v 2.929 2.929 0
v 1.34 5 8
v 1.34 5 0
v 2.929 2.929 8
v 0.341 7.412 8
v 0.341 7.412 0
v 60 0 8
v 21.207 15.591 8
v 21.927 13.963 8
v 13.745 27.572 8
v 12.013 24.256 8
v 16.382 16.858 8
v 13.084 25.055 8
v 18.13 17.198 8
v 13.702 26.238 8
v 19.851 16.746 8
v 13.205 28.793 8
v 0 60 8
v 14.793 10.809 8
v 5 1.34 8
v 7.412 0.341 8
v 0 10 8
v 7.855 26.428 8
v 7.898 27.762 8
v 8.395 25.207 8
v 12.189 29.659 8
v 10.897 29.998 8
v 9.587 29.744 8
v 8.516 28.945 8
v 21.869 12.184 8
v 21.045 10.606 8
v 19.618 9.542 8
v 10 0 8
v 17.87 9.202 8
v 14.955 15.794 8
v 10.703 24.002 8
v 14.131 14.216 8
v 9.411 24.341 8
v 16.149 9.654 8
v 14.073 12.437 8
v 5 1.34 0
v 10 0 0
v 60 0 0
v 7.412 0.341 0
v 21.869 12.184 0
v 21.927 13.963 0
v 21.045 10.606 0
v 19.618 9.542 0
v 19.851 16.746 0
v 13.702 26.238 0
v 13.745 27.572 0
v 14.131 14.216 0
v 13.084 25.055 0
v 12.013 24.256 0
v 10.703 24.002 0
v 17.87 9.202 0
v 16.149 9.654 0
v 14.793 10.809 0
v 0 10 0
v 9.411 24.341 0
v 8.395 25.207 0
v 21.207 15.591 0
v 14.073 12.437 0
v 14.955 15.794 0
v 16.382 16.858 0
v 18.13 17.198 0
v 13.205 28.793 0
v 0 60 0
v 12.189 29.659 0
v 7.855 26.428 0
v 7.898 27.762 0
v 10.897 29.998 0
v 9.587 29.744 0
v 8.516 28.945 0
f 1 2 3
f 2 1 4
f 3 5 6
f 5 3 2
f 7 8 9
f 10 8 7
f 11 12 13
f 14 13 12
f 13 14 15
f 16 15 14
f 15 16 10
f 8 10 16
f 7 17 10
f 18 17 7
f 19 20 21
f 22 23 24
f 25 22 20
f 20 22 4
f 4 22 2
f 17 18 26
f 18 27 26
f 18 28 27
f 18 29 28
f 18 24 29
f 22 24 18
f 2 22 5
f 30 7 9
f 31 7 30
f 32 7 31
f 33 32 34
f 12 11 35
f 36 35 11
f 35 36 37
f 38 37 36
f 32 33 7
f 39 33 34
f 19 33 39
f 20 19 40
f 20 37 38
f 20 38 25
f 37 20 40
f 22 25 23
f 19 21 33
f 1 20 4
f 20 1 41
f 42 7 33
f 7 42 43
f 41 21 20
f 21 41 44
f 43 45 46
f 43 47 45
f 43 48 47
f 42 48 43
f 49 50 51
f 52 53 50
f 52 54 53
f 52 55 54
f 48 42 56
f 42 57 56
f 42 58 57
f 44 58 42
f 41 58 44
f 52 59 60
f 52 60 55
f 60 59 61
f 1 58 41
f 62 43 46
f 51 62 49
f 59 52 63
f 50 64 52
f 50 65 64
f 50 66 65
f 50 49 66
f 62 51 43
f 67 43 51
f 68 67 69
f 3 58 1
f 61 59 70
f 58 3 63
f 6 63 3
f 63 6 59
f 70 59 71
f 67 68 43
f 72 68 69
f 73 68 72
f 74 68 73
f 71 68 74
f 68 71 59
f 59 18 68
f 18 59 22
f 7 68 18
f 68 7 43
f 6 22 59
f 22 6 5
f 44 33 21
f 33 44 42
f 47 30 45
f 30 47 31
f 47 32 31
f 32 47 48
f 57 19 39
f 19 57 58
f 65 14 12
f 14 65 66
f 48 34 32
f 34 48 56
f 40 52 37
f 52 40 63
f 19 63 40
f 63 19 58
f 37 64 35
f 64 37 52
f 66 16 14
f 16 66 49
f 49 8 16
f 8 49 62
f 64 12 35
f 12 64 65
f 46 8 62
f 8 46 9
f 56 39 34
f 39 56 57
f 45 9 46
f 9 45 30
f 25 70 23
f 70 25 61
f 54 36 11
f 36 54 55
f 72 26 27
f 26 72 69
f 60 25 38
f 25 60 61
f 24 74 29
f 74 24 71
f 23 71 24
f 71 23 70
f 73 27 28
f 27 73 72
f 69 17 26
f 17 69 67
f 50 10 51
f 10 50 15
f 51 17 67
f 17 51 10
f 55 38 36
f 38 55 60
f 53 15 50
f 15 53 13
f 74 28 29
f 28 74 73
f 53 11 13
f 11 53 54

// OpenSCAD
$fn = 32;

// ----------------------------------------------------------------------
// Bracket plate: corner pad 60 x 60, fillet R10
// ----------------------------------------------------------------------

// --- parameters (mm) ---
hole_r = 3;               // bolt hole radius
plate_t = 8;              // plate thickness, Z (extrusion height)
leg_a = 60;               // base leg
leg_b = 60;               // height leg
fillet_r = 10;            // right-angle fillet radius

hole_d1 = 2 * hole_r + 2;
hole_d2 = 2 * hole_r;

profile = [[10, 0], [60, 0], [0, 60], [0, 10], [0.341, 7.412], [1.34, 5], [2.929, 2.929], [5, 1.34], [7.412, 0.341]];  // primary outline, 9 points, counter clockwise
void_1 = [[21.927, 13.963], [21.207, 15.591], [19.851, 16.746], [18.13, 17.198], [16.382, 16.858], [14.955, 15.794], [14.131, 14.216], [14.073, 12.437], [14.793, 10.809], [16.149, 9.654], [17.87, 9.202], [19.618, 9.542], [21.045, 10.606], [21.869, 12.184]];  // mount hole 1, 14 points
void_2 = [[13.745, 27.572], [13.205, 28.793], [12.189, 29.659], [10.897, 29.998], [9.587, 29.744], [8.516, 28.945], [7.898, 27.762], [7.855, 26.428], [8.395, 25.207], [9.411, 24.341], [10.703, 24.002], [12.013, 24.256], [13.084, 25.055], [13.702, 26.238]];  // mount hole 2, 14 points

// --- the one profile operation ---
difference() {
  linear_extrude(height = plate_t) polygon(points = profile);
  translate([0, 0, -1])
    linear_extrude(height = plate_t + 2) polygon(points = void_1);
  translate([0, 0, -1])
    linear_extrude(height = plate_t + 2) polygon(points = void_2);
}
